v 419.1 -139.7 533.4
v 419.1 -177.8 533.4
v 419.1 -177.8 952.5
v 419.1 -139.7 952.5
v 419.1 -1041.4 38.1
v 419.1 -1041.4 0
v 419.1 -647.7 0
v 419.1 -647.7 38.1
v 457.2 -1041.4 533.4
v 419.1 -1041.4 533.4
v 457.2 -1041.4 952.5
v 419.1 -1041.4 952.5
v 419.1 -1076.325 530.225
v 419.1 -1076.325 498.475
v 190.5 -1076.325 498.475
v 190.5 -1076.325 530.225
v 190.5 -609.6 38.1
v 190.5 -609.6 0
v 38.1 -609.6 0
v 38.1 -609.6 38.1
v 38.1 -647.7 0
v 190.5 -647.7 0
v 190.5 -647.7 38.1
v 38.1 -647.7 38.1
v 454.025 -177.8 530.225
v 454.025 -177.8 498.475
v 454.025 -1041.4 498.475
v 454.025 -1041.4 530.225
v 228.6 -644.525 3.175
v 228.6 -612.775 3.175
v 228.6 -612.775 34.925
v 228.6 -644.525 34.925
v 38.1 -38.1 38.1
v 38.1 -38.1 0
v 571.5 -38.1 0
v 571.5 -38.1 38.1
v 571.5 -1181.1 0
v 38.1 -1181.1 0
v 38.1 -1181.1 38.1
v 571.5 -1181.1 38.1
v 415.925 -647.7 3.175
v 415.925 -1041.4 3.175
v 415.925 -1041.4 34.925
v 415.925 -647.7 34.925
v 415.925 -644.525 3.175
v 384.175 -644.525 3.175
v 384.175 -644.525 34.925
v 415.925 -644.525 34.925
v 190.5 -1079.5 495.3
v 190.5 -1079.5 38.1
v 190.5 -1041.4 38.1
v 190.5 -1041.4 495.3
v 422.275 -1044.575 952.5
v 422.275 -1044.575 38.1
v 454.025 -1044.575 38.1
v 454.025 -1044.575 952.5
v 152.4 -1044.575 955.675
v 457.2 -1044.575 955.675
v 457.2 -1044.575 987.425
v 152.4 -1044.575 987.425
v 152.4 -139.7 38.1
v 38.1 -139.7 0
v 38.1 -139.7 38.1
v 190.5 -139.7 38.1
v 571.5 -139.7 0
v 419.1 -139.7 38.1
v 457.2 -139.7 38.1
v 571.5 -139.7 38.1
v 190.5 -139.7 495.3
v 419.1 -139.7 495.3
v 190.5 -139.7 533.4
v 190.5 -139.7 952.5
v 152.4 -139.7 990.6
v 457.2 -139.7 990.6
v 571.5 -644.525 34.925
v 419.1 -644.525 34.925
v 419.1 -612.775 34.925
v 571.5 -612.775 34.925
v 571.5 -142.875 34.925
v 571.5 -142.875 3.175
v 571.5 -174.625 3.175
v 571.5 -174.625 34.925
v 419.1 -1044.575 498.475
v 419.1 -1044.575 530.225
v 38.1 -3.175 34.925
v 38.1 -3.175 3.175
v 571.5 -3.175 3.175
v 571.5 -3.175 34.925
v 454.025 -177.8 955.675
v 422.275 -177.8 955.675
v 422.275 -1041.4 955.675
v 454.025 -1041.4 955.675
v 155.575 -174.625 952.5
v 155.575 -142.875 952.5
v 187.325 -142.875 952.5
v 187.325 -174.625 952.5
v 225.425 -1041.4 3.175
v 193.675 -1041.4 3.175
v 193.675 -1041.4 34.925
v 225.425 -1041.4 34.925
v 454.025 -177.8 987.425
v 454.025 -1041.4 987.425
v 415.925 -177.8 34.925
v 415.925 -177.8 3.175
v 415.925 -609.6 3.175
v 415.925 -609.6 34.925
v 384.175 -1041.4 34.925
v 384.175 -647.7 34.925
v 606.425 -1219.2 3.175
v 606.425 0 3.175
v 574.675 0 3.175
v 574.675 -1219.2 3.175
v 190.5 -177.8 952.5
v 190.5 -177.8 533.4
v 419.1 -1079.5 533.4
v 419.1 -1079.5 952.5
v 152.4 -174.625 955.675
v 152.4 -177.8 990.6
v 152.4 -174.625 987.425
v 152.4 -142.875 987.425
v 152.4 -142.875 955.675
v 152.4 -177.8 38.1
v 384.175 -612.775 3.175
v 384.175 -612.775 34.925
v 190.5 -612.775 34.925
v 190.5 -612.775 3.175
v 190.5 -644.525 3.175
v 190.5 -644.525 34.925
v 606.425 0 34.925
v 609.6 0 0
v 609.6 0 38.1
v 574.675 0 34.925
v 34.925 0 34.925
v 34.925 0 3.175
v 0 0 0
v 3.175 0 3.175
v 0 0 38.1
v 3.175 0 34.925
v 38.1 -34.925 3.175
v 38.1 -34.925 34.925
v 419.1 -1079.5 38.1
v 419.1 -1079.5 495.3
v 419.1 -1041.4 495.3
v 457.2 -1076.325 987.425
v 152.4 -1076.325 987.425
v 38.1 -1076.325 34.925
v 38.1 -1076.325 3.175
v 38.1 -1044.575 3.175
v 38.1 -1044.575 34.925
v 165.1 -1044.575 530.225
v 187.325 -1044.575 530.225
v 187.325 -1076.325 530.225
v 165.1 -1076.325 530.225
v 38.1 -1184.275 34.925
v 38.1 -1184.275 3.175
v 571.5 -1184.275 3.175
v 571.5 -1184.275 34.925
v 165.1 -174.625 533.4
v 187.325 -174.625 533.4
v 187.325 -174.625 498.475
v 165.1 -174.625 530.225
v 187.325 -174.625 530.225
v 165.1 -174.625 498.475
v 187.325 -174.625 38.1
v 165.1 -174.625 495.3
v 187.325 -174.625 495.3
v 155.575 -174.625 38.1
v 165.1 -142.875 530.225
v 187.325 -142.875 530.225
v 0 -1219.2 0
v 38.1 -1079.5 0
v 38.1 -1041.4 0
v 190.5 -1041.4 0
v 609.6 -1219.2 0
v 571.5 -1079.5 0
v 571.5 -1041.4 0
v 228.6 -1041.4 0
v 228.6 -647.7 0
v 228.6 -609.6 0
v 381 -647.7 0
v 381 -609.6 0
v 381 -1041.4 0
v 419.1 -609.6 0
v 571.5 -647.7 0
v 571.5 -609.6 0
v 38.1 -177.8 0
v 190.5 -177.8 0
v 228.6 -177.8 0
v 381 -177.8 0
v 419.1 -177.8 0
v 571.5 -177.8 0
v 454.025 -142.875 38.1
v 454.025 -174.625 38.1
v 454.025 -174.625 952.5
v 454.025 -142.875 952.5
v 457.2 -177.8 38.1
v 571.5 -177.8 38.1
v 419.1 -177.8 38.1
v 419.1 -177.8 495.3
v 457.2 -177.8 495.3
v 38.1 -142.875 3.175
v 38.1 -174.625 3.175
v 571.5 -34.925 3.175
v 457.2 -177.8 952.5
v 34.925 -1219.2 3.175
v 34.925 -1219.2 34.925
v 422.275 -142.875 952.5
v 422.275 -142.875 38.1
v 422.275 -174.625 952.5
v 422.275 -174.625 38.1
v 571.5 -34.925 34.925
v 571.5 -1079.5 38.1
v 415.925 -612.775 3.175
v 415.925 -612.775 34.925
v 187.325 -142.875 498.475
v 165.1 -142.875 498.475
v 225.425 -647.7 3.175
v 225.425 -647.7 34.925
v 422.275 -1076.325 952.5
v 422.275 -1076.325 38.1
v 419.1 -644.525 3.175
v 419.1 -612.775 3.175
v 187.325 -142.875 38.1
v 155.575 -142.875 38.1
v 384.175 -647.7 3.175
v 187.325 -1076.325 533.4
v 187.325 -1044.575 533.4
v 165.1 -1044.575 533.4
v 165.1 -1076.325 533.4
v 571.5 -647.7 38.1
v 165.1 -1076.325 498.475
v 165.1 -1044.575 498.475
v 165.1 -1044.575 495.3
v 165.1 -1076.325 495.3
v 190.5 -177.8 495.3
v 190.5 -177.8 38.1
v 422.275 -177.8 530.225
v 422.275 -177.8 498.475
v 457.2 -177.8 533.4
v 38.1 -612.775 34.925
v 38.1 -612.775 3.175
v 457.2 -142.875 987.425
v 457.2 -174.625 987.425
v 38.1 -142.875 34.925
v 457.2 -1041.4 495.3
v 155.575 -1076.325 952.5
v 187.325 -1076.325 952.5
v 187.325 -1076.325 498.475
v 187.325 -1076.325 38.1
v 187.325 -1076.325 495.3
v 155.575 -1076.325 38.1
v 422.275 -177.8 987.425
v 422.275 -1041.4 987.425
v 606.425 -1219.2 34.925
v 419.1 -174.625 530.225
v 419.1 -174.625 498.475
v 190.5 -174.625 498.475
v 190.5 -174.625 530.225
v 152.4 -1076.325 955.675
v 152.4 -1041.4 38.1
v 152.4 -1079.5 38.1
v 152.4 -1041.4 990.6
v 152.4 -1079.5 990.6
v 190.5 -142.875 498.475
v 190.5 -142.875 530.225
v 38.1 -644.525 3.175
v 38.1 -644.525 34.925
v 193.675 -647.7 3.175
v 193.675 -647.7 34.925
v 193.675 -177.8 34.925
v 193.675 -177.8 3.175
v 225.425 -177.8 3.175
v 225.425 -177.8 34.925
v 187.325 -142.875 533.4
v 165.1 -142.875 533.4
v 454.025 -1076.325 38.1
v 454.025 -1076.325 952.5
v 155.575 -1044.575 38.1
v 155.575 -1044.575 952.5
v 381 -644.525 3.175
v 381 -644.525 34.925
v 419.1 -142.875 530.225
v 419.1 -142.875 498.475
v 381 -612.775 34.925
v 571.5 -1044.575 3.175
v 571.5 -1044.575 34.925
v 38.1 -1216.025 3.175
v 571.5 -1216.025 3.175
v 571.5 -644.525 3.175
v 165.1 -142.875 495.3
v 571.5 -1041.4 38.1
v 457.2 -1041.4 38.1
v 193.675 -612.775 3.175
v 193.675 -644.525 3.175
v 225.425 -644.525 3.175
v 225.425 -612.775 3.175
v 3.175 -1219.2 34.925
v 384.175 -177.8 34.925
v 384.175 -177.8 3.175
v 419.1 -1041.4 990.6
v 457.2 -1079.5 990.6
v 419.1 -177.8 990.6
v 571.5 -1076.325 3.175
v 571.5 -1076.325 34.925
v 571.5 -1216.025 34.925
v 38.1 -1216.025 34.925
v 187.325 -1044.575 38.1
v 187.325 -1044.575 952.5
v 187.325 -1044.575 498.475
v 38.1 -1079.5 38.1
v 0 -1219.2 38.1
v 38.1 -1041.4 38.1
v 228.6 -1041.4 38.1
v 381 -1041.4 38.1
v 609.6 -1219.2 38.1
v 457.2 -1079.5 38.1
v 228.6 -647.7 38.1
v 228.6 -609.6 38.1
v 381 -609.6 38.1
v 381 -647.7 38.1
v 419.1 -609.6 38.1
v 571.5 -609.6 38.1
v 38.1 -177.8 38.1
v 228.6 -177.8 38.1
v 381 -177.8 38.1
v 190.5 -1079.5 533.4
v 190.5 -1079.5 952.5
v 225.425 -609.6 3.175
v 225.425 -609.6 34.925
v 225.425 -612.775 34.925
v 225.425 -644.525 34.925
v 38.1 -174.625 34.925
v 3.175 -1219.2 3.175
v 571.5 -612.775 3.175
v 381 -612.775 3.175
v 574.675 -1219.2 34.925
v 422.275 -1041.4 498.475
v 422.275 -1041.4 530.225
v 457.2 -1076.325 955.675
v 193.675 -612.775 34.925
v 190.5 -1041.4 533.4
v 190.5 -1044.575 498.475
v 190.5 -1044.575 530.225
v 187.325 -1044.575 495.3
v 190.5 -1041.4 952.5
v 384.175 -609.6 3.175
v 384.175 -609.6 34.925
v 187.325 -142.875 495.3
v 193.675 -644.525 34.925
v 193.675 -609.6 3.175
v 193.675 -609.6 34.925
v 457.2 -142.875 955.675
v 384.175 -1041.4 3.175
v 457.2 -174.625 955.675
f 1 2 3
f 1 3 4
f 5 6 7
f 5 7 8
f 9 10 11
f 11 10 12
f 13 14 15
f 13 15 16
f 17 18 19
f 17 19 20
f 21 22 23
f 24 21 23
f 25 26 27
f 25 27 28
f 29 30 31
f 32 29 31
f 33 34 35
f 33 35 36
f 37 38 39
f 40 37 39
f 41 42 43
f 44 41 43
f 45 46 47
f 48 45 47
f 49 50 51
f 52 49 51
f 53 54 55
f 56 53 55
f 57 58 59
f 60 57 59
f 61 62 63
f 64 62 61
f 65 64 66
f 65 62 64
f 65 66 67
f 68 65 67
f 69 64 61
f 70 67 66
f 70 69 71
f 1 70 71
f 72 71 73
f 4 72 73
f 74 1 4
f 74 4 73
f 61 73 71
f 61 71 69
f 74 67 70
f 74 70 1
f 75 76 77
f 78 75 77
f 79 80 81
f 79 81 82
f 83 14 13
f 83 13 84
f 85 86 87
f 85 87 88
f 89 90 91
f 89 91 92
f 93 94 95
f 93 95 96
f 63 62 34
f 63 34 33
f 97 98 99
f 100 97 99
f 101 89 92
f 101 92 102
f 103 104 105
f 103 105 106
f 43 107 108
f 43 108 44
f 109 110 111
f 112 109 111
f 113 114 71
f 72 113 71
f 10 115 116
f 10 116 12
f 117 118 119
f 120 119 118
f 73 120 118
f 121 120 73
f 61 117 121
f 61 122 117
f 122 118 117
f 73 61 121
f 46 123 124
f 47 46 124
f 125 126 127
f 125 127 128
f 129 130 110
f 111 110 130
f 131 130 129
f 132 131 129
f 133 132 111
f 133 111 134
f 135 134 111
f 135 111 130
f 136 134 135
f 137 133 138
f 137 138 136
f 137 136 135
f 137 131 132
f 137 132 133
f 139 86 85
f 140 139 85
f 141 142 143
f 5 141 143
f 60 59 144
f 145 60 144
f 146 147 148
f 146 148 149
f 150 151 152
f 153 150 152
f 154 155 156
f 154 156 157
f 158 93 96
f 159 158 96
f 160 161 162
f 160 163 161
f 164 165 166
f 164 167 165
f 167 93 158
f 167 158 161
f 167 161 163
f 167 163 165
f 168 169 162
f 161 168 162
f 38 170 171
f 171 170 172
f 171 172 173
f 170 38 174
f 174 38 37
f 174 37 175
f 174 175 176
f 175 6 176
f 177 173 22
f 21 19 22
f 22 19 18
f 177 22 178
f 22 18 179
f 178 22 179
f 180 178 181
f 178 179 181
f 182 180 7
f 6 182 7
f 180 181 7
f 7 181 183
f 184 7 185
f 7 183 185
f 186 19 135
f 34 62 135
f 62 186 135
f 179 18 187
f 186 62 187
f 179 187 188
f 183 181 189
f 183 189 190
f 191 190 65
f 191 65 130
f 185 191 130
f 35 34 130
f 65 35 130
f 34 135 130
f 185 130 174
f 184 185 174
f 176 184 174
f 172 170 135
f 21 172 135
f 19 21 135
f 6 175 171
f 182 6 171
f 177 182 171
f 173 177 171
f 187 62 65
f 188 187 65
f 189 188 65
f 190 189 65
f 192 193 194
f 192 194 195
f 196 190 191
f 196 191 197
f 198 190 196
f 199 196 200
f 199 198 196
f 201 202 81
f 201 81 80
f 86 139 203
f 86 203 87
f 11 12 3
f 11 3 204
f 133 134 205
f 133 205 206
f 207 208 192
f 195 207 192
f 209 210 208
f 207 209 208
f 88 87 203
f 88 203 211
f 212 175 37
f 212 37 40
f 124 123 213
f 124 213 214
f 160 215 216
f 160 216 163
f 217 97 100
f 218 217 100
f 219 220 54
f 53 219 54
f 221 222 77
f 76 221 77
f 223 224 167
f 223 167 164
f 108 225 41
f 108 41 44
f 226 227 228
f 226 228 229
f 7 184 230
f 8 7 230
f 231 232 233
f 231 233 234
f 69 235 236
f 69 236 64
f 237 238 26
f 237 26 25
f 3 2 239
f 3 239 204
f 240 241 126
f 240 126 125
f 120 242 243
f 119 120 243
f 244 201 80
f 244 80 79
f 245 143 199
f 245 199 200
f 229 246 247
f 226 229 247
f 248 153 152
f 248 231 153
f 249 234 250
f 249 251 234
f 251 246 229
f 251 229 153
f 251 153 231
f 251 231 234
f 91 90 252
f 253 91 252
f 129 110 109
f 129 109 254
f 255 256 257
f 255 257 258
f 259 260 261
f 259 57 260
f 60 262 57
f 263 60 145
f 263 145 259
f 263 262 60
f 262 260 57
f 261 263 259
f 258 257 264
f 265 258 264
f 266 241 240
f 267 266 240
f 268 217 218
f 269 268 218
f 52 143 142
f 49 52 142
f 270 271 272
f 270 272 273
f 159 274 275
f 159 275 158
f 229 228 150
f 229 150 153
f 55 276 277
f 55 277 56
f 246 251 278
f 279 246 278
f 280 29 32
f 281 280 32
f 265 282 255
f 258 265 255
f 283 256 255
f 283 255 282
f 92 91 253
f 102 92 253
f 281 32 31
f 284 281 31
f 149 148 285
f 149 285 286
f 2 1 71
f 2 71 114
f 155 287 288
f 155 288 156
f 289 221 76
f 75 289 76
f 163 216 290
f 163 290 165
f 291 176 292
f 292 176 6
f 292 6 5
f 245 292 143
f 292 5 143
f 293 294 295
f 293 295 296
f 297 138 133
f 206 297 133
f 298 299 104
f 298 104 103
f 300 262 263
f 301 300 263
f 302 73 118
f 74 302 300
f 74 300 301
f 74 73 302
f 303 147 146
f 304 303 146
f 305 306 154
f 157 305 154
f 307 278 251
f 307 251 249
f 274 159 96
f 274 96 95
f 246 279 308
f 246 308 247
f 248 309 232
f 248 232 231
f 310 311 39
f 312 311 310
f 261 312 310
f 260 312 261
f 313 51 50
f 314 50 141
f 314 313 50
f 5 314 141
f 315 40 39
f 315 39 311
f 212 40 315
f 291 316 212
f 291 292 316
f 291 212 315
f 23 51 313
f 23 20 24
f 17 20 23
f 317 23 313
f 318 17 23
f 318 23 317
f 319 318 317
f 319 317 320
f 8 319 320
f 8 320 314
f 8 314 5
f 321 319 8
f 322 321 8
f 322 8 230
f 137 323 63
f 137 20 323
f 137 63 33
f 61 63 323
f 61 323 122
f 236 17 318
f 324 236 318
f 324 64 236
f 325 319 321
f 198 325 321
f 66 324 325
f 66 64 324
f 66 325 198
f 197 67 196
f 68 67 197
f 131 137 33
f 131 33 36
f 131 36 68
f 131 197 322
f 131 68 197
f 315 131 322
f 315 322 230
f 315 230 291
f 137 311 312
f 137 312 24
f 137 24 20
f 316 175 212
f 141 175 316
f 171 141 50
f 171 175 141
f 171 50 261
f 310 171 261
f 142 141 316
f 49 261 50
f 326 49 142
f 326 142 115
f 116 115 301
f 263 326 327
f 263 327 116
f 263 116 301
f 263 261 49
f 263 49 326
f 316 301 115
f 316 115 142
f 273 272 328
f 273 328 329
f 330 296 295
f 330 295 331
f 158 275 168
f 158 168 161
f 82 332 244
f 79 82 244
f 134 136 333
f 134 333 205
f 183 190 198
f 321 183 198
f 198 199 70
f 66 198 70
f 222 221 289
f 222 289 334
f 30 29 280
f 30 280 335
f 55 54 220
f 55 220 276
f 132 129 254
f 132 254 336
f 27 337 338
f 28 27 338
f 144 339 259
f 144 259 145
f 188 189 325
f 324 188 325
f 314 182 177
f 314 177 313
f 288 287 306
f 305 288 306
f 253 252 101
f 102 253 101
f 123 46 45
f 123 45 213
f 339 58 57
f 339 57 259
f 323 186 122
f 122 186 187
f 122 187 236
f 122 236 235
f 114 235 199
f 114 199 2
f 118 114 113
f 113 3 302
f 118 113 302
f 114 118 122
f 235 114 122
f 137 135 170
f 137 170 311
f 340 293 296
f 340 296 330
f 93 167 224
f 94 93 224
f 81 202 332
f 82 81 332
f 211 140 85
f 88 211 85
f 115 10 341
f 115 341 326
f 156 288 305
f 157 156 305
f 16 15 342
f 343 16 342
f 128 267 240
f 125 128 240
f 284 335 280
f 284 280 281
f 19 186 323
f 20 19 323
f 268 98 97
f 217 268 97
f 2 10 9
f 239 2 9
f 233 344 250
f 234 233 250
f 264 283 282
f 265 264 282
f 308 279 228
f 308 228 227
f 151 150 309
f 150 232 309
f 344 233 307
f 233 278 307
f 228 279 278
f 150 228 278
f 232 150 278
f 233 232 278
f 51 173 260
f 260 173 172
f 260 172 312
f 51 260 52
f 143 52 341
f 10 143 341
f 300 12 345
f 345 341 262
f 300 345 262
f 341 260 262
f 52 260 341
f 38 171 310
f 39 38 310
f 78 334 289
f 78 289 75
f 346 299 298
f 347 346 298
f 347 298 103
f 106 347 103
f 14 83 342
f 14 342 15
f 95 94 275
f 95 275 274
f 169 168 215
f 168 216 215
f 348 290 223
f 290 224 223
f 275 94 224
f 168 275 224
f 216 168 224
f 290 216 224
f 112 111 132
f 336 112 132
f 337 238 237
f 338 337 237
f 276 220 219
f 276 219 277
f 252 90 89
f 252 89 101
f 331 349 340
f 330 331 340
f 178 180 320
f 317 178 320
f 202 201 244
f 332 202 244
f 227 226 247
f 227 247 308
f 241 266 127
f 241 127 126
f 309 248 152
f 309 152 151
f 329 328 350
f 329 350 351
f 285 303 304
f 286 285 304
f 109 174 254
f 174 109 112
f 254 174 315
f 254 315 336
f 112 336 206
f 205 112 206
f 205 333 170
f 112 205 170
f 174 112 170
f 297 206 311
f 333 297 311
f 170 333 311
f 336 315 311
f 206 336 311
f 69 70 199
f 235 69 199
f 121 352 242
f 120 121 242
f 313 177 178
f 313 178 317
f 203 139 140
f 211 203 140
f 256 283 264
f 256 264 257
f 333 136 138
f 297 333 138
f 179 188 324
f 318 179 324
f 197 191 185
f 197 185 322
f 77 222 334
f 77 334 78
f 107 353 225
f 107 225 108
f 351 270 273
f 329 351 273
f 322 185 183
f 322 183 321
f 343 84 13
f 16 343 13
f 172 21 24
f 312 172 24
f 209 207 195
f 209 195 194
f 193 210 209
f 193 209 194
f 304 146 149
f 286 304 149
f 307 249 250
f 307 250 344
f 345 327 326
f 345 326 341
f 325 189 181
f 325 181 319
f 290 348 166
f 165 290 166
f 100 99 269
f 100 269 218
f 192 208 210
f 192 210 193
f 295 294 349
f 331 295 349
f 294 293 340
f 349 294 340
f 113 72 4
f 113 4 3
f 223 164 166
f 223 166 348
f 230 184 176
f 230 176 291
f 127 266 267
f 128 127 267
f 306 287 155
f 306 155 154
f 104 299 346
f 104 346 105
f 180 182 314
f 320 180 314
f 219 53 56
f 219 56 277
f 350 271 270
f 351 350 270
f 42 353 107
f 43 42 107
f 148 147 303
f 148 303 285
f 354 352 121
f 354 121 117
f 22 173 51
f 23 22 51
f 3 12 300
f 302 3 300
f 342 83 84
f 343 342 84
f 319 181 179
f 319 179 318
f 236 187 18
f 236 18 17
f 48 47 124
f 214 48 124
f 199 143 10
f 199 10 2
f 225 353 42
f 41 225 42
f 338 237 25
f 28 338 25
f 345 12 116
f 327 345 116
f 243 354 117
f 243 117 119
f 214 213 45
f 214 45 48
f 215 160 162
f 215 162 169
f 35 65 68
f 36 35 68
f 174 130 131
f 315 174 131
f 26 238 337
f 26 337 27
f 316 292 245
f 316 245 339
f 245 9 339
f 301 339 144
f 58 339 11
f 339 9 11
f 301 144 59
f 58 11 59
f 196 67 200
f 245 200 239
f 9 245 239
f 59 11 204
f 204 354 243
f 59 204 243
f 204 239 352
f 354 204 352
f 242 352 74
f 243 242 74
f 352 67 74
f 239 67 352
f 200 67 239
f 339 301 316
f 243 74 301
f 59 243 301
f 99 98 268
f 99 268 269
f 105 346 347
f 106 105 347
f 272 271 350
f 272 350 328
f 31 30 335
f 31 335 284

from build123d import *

# Parameters (mm, degrees)
F0_W      = 38.1
F0_H      = 38.1
F0_W_2    = 31.75
F0_H_2    = 31.75
F1_DEPTH  = 1219.2
F2_W      = 38.1
F2_H      = 38.1
F2_W_2    = 31.75
F2_H_2    = 31.75
F3_DEPTH  = 533.4
F4_W      = 38.1
F4_H      = 38.1
F4_W_2    = 31.75
F4_H_2    = 31.75
F5_DEPTH  = 1219.2
F6_W      = 38.1
F6_H      = 38.1
F6_W_2    = 31.75
F6_H_2    = 31.75
F7_DEPTH  = 533.4
F8_W      = 38.1
F8_H      = 38.1
F8_W_2    = 31.75
F8_H_2    = 31.75
F9_DEPTH  = 863.6
F10_W     = 38.1
F10_H     = 38.1
F10_W_2   = 31.75
F10_H_2   = 31.75
F11_DEPTH = 914.4
F12_W     = 38.1
F12_H     = 38.1
F12_W_2   = 31.75
F12_H_2   = 31.75
F13_DEPTH = 304.8
F14_W     = 38.1
F14_H     = 38.1
F14_W_2   = 31.75
F14_H_2   = 31.75
F15_DEPTH = 863.6
F16_W     = 38.1
F16_H     = 38.1
F16_W_2   = 31.75
F16_H_2   = 31.75
F17_DEPTH = 254


with BuildPart() as f1:
    # F0 (on Front) → F1 (new body)
    with BuildSketch(Plane.XZ):
        with Locations((19.05, 19.05)):
            Rectangle(F0_W, F0_H)
        with Locations((19.05, 19.05)):
            Rectangle(F0_W_2, F0_H_2, mode=Mode.SUBTRACT)
    extrude(amount=F1_DEPTH)

    # F2 (on face) → F3 (join)
    with BuildSketch(Plane.YZ.offset(38.1)):
        with Locations((-1200.15, 19.05)):
            Rectangle(F2_W, F2_H)
        with Locations((-1200.15, 19.05)):
            Rectangle(F2_W_2, F2_H_2, mode=Mode.SUBTRACT)
        with Locations((-19.05, 19.05)):
            Rectangle(F2_W, F2_H)
        with Locations((-19.05, 19.05)):
            Rectangle(F2_W_2, F2_H_2, mode=Mode.SUBTRACT)
    extrude(amount=F3_DEPTH)

    # F4 (on face) → F5 (join)
    with BuildSketch(Plane(origin=(0, 0, 0), x_dir=(-1, 0, 0), z_dir=(0, 1, 0))):
        with Locations((-590.55, 19.05)):
            Rectangle(F4_W, F4_H)
        with Locations((-590.55, 19.05)):
            Rectangle(F4_W_2, F4_H_2, mode=Mode.SUBTRACT)
    extrude(amount=-F5_DEPTH)

    # F6 (on face) → F7 (join)
    with BuildSketch(Plane.YZ.offset(38.1)):
        with Locations((-1060.45, 19.05)):
            Rectangle(F6_W, F6_H)
        with Locations((-1060.45, 19.05)):
            Rectangle(F6_W_2, F6_H_2, mode=Mode.SUBTRACT)
        with Locations((-158.75, 19.05)):
            Rectangle(F6_W, F6_H)
        with Locations((-158.75, 19.05)):
            Rectangle(F6_W_2, F6_H_2, mode=Mode.SUBTRACT)
        with Locations((-628.65, 19.05)):
            Rectangle(F6_W, F6_H)
        with Locations((-628.65, 19.05)):
            Rectangle(F6_W_2, F6_H_2, mode=Mode.SUBTRACT)
    extrude(amount=F7_DEPTH)

    # F8 (on face) → F9 (join)
    with BuildSketch(Plane.XZ.offset(177.8)):
        with Locations((209.55, 19.05)):
            Rectangle(F8_W, F8_H)
        with Locations((209.55, 19.05)):
            Rectangle(F8_W_2, F8_H_2, mode=Mode.SUBTRACT)
        with Locations((400.05, 19.05)):
            Rectangle(F8_W, F8_H)
        with Locations((400.05, 19.05)):
            Rectangle(F8_W_2, F8_H_2, mode=Mode.SUBTRACT)
    extrude(amount=F9_DEPTH)

    # F10 (on face) → F11 (join)
    with BuildSketch(Plane.XY.offset(38.1)):
        with Locations((438.15, -158.75)):
            Rectangle(F10_W, F10_H)
        with Locations((438.15, -158.75)):
            Rectangle(F10_W_2, F10_H_2, mode=Mode.SUBTRACT)
        with Locations((171.45, -158.75)):
            Rectangle(F10_W, F10_H)
        with Locations((171.45, -158.75)):
            Rectangle(F10_W_2, F10_H_2, mode=Mode.SUBTRACT)
        with Locations((438.15, -1060.45)):
            Rectangle(F10_W, F10_H)
        with Locations((438.15, -1060.45)):
            Rectangle(F10_W_2, F10_H_2, mode=Mode.SUBTRACT)
        with Locations((171.45, -1060.45)):
            Rectangle(F10_W, F10_H)
        with Locations((171.45, -1060.45)):
            Rectangle(F10_W_2, F10_H_2, mode=Mode.SUBTRACT)
    extrude(amount=F11_DEPTH)

    # F12 (on face) → F13 (join)
    with BuildSketch(Plane(origin=(152.4, 0, 0), x_dir=(0, -1, 0), z_dir=(-1, 0, 0))):
        with Locations((1060.45, 971.55)):
            Rectangle(F12_W, F12_H)
        with Locations((1060.45, 971.55)):
            Rectangle(F12_W_2, F12_H_2, mode=Mode.SUBTRACT)
        with Locations((158.75, 971.55)):
            Rectangle(F12_W, F12_H)
        with Locations((158.75, 971.55)):
            Rectangle(F12_W_2, F12_H_2, mode=Mode.SUBTRACT)
    extrude(amount=-F13_DEPTH)

    # F14 (on face) → F15 (join)
    with BuildSketch(Plane.XZ.offset(177.8)):
        with Locations((438.15, 971.55)):
            Rectangle(F14_W, F14_H)
        with Locations((438.15, 971.55)):
            Rectangle(F14_W_2, F14_H_2, mode=Mode.SUBTRACT)
        with Locations((438.15, 514.35)):
            Rectangle(F14_W, F14_H)
        with Locations((438.15, 514.35)):
            Rectangle(F14_W_2, F14_H_2, mode=Mode.SUBTRACT)
    extrude(amount=F15_DEPTH)

    # F16 (on face) → F17 (join)
    with BuildSketch(Plane(origin=(419.1, 0, 0), x_dir=(0, -1, 0), z_dir=(-1, 0, 0))):
        with Locations((158.75, 514.35)):
            Rectangle(F16_W, F16_H)
        with Locations((158.75, 514.35)):
            Rectangle(F16_W_2, F16_H_2, mode=Mode.SUBTRACT)
        with Locations((1060.45, 514.35)):
            Rectangle(F16_W, F16_H)
        with Locations((1060.45, 514.35)):
            Rectangle(F16_W_2, F16_H_2, mode=Mode.SUBTRACT)
    extrude(amount=F17_DEPTH)


solid = f1.part
